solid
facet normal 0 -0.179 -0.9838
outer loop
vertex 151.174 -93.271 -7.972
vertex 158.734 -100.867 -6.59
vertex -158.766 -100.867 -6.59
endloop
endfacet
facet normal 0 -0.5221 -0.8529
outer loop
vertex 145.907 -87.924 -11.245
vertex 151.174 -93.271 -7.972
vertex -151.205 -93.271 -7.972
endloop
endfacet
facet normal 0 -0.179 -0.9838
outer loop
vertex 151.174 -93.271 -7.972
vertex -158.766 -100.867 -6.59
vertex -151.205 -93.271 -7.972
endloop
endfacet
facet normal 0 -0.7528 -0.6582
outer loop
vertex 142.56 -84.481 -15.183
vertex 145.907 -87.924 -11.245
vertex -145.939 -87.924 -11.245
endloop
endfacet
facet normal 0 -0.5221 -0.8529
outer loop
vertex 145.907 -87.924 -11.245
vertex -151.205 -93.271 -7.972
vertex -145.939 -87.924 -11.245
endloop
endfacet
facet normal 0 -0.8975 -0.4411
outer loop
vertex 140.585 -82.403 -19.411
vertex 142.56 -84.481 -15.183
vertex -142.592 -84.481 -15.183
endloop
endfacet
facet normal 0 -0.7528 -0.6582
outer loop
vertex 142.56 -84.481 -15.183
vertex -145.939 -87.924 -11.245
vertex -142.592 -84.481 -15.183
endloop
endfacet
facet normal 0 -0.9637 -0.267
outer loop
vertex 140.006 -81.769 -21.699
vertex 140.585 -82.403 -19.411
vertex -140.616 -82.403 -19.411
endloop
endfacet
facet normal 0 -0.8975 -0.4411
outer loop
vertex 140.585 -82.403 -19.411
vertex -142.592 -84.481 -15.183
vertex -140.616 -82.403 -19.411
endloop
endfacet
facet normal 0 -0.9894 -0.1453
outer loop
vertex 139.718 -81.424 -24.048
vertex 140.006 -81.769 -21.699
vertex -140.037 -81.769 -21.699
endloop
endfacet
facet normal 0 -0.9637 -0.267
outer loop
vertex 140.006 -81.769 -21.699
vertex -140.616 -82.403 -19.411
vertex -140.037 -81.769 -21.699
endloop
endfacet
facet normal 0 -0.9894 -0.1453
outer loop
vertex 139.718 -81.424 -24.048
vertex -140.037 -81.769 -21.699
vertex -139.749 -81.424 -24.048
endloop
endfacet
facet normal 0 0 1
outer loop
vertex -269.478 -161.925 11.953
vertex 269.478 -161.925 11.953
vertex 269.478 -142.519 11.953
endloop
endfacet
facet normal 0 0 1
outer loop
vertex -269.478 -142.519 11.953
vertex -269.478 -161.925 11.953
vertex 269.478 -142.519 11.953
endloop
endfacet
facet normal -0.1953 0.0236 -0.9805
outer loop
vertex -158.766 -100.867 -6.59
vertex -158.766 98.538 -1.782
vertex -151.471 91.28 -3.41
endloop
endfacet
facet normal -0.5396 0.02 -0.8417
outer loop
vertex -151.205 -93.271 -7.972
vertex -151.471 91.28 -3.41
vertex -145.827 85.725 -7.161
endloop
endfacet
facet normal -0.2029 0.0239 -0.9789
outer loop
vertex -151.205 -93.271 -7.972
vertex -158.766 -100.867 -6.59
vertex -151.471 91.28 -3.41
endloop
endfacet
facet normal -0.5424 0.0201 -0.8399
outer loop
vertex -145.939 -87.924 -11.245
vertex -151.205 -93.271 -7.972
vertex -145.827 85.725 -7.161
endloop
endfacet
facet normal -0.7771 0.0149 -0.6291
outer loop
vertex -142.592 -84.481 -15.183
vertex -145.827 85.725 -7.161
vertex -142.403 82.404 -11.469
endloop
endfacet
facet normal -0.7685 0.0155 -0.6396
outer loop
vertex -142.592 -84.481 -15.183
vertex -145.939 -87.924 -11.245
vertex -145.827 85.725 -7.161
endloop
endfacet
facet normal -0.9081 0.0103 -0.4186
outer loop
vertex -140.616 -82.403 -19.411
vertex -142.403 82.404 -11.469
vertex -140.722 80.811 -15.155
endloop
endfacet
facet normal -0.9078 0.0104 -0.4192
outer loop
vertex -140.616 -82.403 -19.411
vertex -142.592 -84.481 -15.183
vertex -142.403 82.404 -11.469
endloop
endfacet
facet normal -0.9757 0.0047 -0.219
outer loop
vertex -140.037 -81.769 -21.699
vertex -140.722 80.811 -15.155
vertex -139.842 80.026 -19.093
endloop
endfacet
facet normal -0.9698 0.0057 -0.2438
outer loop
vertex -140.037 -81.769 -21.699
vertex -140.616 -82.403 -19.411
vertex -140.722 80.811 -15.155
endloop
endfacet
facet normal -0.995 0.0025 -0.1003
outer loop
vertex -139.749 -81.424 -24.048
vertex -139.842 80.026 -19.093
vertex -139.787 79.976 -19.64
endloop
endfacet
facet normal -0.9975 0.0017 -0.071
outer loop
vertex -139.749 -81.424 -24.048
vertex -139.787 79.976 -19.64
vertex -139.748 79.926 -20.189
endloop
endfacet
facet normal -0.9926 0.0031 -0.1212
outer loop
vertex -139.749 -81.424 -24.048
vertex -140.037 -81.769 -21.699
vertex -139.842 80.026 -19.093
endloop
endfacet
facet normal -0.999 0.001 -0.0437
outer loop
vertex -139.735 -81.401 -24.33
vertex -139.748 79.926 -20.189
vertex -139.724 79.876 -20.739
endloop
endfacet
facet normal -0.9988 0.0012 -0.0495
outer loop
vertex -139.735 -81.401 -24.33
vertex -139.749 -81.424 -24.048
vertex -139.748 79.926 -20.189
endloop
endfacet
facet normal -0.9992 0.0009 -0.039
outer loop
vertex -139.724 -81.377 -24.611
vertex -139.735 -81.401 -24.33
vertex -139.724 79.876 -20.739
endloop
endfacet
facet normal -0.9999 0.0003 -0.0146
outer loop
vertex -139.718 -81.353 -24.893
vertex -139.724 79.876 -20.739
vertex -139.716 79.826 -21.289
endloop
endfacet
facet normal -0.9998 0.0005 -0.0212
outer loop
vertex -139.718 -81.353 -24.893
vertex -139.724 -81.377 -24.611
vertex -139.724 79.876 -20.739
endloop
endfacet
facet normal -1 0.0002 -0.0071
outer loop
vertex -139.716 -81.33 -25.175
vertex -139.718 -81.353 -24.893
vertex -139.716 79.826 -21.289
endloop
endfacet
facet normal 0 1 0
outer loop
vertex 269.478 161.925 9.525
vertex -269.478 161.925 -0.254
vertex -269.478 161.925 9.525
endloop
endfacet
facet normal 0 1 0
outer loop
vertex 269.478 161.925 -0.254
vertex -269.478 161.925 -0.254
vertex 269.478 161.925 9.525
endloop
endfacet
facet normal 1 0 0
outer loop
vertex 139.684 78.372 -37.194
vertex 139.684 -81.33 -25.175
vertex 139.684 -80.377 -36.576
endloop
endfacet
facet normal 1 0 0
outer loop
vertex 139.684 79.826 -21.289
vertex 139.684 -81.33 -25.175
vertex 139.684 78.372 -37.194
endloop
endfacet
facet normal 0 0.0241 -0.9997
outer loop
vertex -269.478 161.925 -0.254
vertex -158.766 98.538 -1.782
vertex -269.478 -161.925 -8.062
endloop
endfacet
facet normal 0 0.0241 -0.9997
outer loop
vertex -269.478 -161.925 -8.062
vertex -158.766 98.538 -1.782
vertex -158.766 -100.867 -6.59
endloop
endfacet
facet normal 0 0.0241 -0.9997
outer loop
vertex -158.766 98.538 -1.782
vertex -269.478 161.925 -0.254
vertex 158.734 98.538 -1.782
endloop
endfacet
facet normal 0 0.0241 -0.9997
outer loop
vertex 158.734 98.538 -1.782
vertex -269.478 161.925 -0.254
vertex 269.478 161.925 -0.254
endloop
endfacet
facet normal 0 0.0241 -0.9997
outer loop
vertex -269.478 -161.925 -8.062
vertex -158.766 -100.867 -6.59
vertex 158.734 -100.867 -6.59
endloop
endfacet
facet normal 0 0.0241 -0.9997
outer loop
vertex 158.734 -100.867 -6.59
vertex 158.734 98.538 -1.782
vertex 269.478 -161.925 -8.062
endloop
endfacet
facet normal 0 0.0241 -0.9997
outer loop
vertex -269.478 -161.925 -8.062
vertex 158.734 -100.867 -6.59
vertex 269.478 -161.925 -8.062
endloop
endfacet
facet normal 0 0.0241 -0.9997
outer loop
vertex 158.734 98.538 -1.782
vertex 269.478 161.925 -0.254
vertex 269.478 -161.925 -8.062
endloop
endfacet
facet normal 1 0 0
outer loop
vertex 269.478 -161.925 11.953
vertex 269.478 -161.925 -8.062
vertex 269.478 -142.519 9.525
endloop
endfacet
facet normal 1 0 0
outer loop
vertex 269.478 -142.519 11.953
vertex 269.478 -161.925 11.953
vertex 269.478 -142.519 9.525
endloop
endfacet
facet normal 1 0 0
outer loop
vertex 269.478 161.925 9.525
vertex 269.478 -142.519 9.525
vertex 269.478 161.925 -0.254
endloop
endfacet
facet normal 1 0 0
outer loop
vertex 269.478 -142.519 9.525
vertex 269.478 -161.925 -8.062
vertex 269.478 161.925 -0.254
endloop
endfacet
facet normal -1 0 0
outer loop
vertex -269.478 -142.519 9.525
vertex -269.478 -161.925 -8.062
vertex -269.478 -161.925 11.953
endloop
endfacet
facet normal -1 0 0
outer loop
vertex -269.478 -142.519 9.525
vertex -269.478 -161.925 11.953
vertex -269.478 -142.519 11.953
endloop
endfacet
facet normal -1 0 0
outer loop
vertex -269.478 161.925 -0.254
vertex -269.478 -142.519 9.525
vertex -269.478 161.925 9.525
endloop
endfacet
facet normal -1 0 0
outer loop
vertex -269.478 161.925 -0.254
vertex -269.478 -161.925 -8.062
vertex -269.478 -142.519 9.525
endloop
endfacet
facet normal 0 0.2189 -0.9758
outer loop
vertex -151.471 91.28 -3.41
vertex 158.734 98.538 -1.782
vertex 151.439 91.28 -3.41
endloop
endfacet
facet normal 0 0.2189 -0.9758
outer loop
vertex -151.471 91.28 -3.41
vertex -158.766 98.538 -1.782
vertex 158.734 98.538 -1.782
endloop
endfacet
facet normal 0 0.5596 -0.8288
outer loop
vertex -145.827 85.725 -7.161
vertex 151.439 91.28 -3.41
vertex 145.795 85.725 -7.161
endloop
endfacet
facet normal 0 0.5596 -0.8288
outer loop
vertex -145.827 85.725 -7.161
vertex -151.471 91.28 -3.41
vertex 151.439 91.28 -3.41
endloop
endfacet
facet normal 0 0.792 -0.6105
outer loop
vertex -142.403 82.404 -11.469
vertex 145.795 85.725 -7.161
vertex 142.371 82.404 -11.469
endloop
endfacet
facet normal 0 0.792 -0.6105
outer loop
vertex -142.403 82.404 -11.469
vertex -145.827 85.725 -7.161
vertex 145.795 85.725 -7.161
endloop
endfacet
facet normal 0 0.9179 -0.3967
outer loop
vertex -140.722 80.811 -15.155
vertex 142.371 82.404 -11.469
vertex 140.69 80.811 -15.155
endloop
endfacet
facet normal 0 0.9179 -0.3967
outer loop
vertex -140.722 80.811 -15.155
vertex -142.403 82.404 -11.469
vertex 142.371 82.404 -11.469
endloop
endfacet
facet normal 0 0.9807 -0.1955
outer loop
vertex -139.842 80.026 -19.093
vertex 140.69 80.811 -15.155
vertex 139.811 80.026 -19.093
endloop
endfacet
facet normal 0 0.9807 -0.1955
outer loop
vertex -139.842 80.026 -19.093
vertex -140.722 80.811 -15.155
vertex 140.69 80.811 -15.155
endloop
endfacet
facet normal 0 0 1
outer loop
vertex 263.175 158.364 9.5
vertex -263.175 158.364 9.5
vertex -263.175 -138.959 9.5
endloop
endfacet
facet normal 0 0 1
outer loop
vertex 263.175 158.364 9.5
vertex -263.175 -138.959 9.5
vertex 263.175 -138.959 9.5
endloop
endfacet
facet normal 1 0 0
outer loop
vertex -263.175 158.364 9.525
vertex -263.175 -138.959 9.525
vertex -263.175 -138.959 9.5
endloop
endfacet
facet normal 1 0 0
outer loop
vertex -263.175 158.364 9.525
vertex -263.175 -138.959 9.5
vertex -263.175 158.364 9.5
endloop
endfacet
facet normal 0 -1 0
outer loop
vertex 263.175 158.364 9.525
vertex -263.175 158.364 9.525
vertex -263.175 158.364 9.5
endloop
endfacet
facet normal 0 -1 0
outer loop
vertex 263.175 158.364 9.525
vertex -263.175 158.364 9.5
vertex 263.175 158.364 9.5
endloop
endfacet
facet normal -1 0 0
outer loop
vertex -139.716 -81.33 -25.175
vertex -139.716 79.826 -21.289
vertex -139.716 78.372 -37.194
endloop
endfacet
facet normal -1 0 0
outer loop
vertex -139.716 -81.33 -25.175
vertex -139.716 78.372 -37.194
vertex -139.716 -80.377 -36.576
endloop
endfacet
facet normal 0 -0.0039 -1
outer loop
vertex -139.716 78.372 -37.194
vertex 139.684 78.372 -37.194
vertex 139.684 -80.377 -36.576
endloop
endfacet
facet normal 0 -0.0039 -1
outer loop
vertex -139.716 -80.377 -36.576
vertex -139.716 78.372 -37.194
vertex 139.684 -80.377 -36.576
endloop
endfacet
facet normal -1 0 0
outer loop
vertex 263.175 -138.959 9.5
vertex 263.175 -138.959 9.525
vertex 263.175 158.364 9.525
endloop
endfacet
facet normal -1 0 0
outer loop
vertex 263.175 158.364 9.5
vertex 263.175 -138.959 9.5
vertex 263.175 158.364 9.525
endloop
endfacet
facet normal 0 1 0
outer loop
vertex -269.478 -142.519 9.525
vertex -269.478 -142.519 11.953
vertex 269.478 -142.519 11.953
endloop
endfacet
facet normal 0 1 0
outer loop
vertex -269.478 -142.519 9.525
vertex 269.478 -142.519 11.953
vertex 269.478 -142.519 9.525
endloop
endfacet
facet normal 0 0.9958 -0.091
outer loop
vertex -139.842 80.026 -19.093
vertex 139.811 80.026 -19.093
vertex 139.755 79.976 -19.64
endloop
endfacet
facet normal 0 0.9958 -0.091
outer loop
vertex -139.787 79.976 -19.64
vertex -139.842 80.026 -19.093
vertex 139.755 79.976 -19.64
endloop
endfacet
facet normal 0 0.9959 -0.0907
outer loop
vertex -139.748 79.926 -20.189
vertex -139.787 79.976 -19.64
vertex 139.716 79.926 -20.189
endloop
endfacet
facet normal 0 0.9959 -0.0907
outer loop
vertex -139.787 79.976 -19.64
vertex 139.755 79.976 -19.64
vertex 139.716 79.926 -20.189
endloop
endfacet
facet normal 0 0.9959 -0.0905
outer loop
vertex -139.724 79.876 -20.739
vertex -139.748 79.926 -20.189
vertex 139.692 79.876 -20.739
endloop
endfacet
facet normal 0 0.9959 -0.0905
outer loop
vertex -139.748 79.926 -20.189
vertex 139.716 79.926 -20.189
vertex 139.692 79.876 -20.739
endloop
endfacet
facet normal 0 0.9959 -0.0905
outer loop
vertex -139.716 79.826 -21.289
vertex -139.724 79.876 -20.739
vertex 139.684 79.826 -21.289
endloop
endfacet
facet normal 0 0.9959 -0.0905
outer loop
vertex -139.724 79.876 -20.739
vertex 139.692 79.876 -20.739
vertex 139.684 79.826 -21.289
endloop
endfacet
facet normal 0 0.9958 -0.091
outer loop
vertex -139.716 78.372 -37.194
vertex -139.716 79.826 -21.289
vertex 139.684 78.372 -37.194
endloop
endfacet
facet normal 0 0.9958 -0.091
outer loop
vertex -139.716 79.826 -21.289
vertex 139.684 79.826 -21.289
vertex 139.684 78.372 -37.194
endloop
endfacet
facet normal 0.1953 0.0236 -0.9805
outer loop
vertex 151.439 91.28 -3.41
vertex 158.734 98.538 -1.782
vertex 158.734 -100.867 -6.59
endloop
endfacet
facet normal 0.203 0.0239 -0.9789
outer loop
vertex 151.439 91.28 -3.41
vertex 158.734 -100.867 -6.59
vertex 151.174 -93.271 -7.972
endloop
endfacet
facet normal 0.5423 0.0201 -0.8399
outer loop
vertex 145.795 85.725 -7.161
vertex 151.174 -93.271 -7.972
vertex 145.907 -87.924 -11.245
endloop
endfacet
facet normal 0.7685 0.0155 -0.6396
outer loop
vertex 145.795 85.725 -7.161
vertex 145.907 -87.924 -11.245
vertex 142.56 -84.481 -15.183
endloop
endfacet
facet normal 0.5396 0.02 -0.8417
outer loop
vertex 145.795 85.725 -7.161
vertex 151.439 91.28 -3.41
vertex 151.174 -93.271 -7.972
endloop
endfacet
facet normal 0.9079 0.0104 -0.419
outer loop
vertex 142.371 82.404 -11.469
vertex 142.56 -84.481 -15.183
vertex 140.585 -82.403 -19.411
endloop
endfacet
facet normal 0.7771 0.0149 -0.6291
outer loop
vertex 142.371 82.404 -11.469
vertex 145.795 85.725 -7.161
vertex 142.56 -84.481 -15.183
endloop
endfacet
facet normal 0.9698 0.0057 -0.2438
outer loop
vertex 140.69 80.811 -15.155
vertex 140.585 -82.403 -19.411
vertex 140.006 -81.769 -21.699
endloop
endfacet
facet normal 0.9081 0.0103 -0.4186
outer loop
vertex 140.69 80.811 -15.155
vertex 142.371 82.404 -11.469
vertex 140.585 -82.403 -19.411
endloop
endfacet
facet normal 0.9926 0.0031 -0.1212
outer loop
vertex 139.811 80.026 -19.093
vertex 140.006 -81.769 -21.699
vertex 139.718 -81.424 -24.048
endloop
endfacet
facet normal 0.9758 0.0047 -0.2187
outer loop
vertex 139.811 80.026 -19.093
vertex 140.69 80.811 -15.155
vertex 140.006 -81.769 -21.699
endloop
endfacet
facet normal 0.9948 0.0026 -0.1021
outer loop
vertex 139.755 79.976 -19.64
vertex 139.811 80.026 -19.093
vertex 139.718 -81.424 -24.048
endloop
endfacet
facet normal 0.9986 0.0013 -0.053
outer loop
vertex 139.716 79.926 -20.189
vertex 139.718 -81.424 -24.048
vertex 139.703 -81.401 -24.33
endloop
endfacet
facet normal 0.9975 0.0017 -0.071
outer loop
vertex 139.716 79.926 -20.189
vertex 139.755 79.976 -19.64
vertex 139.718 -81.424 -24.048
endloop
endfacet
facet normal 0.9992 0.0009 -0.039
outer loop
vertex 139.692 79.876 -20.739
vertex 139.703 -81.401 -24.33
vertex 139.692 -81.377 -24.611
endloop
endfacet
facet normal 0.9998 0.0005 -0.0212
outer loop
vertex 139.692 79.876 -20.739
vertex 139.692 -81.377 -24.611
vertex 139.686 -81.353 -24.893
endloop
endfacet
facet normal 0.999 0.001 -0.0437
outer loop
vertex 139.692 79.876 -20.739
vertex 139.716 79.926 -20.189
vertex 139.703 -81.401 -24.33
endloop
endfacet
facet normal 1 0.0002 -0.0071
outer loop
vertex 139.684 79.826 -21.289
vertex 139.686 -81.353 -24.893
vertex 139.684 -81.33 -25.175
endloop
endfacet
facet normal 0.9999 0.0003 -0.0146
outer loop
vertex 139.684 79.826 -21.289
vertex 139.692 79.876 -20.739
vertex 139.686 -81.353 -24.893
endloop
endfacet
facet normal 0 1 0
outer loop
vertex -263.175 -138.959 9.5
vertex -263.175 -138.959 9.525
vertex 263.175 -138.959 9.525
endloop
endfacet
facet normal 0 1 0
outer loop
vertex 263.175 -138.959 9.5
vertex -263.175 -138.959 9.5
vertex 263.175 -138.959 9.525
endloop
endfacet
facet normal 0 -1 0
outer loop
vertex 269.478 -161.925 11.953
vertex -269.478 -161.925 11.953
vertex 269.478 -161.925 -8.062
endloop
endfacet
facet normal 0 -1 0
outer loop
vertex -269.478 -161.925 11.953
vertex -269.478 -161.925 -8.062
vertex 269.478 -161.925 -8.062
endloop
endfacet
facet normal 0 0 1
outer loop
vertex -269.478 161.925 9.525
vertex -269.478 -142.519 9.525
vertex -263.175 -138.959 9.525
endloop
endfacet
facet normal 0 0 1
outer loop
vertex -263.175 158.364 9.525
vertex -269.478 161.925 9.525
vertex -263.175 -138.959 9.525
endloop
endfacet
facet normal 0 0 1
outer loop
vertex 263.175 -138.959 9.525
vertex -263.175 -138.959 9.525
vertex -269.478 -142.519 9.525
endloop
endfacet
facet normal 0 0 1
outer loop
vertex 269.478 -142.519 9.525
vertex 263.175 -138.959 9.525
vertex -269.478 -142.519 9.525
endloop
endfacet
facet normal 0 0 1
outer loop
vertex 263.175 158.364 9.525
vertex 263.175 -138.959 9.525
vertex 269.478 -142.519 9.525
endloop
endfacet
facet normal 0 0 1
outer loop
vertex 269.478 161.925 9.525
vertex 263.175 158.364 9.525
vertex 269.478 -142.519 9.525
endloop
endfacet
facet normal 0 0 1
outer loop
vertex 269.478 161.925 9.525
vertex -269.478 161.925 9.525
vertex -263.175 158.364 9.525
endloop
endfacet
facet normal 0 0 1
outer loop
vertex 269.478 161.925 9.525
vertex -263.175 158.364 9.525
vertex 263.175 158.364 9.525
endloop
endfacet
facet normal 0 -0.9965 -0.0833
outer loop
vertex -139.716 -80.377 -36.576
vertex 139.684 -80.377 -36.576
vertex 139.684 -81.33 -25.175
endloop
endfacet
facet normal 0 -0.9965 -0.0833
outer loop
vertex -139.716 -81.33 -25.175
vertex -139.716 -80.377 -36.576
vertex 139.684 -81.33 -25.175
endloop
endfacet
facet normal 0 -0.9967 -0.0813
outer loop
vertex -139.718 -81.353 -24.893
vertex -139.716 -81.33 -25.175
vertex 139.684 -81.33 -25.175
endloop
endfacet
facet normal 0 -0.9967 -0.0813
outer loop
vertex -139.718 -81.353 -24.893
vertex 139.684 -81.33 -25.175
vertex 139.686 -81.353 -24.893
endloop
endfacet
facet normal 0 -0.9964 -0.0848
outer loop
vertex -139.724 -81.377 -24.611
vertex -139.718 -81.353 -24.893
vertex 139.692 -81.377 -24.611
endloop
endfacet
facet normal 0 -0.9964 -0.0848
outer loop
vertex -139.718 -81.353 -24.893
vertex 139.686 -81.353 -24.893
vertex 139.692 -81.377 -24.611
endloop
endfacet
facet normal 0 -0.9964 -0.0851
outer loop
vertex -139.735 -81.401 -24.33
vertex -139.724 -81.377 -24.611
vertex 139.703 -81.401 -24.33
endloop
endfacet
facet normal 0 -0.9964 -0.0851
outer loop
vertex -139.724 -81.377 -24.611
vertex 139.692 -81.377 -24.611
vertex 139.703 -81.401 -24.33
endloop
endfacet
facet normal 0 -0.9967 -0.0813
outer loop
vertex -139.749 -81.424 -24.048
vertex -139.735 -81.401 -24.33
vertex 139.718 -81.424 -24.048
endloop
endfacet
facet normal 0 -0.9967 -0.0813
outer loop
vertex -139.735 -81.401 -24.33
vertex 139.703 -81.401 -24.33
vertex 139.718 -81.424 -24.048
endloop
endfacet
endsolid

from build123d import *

# Parameters (mm, degrees)
SKETCH1_W           = 538.9562500000001
SKETCH1_H           = 323.84999999999997
BOSS_EXTRUDE1_DEPTH = 9.525
BOSS_EXTRUDE2_DEPTH = 538.95625
BOSS_EXTRUDE3_DEPTH = 538.95625
CUT_EXTRUDE1_DEPTH  = 317.16786663403565
FILLET1_R           = 19.05
SKETCH6_W           = 526.3492063472065
SKETCH6_H           = 297.32296140336337
CUT_EXTRUDE2_DEPTH  = 0.0254


with BuildPart() as part:
    # Sketch1 → Boss-Extrude1 (new body)
    with BuildSketch(Plane.XY):
        Rectangle(SKETCH1_W, SKETCH1_H)
    extrude(amount=BOSS_EXTRUDE1_DEPTH)

    # Sketch3 → Boss-Extrude2 (add)
    with BuildSketch(Plane(origin=(269.47812500000003, 0, 0), x_dir=(0, 0, -1), z_dir=(1, 0, 0))):
        Polygon((-9.525, 161.92499999999998), (0.253999999999999, 161.92499999999998), (8.062497413649258, -161.92499999999998), (0, -161.92499999999998), (-9.525, -161.92499999999998), (-11.952702586350743, -161.92499999999998), (-11.95270258635074, -142.5194), (-9.525, -142.5194), align=None)
    extrude(amount=-BOSS_EXTRUDE2_DEPTH)

    # Sketch4 → Boss-Extrude3 (add)
    with BuildSketch(Plane(origin=(269.47812500000003, 0, 0), x_dir=(0, 0, -1), z_dir=(1, 0, 0))):
        Polygon((37.193592332721494, 78.37169999999999), (36.576258201765725, -80.3770996759999), (6.157552828059534, -82.9192359761992), (2.191447852529644, 81.57119390858017), align=None)
    extrude(amount=-BOSS_EXTRUDE3_DEPTH)

    # Sketch5 → Cut-Extrude1 (cut, through all)
    with BuildSketch(Plane(origin=(0, 0.10020320699075866, -4.1558326608693195), x_dir=(-1, 0, 0), z_dir=(0, 0.024104457676112176, -0.9997094453490677))):
        Polygon((-139.684125, -83.04356787806702), (-139.68412500000005, 81.4946693567972), (-269.47812500000003, 81.49466935679719), (-269.47812500000003, -83.04356787806695), align=None)
        Polygon((269.47812500000003, 81.4946693567972), (139.71587499999993, 81.49466935679719), (139.71587499999995, -83.04356787806701), (269.47812500000003, -83.04356787806702), align=None)
    extrude(amount=CUT_EXTRUDE1_DEPTH, mode=Mode.SUBTRACT)

    # Fillet1
    fillet1_edges = [part.edges().sort_by_distance(p)[0] for p in [
        (-0.01587499999999409, -82.9192359761992, -6.157552828059534),
        (-0.01587499999993724, 81.57119390858017, -2.191447852529644),
        (139.68412500000002, -0.6740210338095626, -4.17450034029459),
        (-139.71587499999993, -0.6740210338095626, -4.17450034029459),
    ]]
    fillet(fillet1_edges, radius=FILLET1_R)

    # Sketch6 → Cut-Extrude2 (cut)
    with BuildSketch(Plane.XY.offset(9.525)):
        with Locations((2.842e-14, 9.70280000000001)):
            Rectangle(SKETCH6_W, SKETCH6_H)
    extrude(amount=-CUT_EXTRUDE2_DEPTH, mode=Mode.SUBTRACT)


solid = part.part
